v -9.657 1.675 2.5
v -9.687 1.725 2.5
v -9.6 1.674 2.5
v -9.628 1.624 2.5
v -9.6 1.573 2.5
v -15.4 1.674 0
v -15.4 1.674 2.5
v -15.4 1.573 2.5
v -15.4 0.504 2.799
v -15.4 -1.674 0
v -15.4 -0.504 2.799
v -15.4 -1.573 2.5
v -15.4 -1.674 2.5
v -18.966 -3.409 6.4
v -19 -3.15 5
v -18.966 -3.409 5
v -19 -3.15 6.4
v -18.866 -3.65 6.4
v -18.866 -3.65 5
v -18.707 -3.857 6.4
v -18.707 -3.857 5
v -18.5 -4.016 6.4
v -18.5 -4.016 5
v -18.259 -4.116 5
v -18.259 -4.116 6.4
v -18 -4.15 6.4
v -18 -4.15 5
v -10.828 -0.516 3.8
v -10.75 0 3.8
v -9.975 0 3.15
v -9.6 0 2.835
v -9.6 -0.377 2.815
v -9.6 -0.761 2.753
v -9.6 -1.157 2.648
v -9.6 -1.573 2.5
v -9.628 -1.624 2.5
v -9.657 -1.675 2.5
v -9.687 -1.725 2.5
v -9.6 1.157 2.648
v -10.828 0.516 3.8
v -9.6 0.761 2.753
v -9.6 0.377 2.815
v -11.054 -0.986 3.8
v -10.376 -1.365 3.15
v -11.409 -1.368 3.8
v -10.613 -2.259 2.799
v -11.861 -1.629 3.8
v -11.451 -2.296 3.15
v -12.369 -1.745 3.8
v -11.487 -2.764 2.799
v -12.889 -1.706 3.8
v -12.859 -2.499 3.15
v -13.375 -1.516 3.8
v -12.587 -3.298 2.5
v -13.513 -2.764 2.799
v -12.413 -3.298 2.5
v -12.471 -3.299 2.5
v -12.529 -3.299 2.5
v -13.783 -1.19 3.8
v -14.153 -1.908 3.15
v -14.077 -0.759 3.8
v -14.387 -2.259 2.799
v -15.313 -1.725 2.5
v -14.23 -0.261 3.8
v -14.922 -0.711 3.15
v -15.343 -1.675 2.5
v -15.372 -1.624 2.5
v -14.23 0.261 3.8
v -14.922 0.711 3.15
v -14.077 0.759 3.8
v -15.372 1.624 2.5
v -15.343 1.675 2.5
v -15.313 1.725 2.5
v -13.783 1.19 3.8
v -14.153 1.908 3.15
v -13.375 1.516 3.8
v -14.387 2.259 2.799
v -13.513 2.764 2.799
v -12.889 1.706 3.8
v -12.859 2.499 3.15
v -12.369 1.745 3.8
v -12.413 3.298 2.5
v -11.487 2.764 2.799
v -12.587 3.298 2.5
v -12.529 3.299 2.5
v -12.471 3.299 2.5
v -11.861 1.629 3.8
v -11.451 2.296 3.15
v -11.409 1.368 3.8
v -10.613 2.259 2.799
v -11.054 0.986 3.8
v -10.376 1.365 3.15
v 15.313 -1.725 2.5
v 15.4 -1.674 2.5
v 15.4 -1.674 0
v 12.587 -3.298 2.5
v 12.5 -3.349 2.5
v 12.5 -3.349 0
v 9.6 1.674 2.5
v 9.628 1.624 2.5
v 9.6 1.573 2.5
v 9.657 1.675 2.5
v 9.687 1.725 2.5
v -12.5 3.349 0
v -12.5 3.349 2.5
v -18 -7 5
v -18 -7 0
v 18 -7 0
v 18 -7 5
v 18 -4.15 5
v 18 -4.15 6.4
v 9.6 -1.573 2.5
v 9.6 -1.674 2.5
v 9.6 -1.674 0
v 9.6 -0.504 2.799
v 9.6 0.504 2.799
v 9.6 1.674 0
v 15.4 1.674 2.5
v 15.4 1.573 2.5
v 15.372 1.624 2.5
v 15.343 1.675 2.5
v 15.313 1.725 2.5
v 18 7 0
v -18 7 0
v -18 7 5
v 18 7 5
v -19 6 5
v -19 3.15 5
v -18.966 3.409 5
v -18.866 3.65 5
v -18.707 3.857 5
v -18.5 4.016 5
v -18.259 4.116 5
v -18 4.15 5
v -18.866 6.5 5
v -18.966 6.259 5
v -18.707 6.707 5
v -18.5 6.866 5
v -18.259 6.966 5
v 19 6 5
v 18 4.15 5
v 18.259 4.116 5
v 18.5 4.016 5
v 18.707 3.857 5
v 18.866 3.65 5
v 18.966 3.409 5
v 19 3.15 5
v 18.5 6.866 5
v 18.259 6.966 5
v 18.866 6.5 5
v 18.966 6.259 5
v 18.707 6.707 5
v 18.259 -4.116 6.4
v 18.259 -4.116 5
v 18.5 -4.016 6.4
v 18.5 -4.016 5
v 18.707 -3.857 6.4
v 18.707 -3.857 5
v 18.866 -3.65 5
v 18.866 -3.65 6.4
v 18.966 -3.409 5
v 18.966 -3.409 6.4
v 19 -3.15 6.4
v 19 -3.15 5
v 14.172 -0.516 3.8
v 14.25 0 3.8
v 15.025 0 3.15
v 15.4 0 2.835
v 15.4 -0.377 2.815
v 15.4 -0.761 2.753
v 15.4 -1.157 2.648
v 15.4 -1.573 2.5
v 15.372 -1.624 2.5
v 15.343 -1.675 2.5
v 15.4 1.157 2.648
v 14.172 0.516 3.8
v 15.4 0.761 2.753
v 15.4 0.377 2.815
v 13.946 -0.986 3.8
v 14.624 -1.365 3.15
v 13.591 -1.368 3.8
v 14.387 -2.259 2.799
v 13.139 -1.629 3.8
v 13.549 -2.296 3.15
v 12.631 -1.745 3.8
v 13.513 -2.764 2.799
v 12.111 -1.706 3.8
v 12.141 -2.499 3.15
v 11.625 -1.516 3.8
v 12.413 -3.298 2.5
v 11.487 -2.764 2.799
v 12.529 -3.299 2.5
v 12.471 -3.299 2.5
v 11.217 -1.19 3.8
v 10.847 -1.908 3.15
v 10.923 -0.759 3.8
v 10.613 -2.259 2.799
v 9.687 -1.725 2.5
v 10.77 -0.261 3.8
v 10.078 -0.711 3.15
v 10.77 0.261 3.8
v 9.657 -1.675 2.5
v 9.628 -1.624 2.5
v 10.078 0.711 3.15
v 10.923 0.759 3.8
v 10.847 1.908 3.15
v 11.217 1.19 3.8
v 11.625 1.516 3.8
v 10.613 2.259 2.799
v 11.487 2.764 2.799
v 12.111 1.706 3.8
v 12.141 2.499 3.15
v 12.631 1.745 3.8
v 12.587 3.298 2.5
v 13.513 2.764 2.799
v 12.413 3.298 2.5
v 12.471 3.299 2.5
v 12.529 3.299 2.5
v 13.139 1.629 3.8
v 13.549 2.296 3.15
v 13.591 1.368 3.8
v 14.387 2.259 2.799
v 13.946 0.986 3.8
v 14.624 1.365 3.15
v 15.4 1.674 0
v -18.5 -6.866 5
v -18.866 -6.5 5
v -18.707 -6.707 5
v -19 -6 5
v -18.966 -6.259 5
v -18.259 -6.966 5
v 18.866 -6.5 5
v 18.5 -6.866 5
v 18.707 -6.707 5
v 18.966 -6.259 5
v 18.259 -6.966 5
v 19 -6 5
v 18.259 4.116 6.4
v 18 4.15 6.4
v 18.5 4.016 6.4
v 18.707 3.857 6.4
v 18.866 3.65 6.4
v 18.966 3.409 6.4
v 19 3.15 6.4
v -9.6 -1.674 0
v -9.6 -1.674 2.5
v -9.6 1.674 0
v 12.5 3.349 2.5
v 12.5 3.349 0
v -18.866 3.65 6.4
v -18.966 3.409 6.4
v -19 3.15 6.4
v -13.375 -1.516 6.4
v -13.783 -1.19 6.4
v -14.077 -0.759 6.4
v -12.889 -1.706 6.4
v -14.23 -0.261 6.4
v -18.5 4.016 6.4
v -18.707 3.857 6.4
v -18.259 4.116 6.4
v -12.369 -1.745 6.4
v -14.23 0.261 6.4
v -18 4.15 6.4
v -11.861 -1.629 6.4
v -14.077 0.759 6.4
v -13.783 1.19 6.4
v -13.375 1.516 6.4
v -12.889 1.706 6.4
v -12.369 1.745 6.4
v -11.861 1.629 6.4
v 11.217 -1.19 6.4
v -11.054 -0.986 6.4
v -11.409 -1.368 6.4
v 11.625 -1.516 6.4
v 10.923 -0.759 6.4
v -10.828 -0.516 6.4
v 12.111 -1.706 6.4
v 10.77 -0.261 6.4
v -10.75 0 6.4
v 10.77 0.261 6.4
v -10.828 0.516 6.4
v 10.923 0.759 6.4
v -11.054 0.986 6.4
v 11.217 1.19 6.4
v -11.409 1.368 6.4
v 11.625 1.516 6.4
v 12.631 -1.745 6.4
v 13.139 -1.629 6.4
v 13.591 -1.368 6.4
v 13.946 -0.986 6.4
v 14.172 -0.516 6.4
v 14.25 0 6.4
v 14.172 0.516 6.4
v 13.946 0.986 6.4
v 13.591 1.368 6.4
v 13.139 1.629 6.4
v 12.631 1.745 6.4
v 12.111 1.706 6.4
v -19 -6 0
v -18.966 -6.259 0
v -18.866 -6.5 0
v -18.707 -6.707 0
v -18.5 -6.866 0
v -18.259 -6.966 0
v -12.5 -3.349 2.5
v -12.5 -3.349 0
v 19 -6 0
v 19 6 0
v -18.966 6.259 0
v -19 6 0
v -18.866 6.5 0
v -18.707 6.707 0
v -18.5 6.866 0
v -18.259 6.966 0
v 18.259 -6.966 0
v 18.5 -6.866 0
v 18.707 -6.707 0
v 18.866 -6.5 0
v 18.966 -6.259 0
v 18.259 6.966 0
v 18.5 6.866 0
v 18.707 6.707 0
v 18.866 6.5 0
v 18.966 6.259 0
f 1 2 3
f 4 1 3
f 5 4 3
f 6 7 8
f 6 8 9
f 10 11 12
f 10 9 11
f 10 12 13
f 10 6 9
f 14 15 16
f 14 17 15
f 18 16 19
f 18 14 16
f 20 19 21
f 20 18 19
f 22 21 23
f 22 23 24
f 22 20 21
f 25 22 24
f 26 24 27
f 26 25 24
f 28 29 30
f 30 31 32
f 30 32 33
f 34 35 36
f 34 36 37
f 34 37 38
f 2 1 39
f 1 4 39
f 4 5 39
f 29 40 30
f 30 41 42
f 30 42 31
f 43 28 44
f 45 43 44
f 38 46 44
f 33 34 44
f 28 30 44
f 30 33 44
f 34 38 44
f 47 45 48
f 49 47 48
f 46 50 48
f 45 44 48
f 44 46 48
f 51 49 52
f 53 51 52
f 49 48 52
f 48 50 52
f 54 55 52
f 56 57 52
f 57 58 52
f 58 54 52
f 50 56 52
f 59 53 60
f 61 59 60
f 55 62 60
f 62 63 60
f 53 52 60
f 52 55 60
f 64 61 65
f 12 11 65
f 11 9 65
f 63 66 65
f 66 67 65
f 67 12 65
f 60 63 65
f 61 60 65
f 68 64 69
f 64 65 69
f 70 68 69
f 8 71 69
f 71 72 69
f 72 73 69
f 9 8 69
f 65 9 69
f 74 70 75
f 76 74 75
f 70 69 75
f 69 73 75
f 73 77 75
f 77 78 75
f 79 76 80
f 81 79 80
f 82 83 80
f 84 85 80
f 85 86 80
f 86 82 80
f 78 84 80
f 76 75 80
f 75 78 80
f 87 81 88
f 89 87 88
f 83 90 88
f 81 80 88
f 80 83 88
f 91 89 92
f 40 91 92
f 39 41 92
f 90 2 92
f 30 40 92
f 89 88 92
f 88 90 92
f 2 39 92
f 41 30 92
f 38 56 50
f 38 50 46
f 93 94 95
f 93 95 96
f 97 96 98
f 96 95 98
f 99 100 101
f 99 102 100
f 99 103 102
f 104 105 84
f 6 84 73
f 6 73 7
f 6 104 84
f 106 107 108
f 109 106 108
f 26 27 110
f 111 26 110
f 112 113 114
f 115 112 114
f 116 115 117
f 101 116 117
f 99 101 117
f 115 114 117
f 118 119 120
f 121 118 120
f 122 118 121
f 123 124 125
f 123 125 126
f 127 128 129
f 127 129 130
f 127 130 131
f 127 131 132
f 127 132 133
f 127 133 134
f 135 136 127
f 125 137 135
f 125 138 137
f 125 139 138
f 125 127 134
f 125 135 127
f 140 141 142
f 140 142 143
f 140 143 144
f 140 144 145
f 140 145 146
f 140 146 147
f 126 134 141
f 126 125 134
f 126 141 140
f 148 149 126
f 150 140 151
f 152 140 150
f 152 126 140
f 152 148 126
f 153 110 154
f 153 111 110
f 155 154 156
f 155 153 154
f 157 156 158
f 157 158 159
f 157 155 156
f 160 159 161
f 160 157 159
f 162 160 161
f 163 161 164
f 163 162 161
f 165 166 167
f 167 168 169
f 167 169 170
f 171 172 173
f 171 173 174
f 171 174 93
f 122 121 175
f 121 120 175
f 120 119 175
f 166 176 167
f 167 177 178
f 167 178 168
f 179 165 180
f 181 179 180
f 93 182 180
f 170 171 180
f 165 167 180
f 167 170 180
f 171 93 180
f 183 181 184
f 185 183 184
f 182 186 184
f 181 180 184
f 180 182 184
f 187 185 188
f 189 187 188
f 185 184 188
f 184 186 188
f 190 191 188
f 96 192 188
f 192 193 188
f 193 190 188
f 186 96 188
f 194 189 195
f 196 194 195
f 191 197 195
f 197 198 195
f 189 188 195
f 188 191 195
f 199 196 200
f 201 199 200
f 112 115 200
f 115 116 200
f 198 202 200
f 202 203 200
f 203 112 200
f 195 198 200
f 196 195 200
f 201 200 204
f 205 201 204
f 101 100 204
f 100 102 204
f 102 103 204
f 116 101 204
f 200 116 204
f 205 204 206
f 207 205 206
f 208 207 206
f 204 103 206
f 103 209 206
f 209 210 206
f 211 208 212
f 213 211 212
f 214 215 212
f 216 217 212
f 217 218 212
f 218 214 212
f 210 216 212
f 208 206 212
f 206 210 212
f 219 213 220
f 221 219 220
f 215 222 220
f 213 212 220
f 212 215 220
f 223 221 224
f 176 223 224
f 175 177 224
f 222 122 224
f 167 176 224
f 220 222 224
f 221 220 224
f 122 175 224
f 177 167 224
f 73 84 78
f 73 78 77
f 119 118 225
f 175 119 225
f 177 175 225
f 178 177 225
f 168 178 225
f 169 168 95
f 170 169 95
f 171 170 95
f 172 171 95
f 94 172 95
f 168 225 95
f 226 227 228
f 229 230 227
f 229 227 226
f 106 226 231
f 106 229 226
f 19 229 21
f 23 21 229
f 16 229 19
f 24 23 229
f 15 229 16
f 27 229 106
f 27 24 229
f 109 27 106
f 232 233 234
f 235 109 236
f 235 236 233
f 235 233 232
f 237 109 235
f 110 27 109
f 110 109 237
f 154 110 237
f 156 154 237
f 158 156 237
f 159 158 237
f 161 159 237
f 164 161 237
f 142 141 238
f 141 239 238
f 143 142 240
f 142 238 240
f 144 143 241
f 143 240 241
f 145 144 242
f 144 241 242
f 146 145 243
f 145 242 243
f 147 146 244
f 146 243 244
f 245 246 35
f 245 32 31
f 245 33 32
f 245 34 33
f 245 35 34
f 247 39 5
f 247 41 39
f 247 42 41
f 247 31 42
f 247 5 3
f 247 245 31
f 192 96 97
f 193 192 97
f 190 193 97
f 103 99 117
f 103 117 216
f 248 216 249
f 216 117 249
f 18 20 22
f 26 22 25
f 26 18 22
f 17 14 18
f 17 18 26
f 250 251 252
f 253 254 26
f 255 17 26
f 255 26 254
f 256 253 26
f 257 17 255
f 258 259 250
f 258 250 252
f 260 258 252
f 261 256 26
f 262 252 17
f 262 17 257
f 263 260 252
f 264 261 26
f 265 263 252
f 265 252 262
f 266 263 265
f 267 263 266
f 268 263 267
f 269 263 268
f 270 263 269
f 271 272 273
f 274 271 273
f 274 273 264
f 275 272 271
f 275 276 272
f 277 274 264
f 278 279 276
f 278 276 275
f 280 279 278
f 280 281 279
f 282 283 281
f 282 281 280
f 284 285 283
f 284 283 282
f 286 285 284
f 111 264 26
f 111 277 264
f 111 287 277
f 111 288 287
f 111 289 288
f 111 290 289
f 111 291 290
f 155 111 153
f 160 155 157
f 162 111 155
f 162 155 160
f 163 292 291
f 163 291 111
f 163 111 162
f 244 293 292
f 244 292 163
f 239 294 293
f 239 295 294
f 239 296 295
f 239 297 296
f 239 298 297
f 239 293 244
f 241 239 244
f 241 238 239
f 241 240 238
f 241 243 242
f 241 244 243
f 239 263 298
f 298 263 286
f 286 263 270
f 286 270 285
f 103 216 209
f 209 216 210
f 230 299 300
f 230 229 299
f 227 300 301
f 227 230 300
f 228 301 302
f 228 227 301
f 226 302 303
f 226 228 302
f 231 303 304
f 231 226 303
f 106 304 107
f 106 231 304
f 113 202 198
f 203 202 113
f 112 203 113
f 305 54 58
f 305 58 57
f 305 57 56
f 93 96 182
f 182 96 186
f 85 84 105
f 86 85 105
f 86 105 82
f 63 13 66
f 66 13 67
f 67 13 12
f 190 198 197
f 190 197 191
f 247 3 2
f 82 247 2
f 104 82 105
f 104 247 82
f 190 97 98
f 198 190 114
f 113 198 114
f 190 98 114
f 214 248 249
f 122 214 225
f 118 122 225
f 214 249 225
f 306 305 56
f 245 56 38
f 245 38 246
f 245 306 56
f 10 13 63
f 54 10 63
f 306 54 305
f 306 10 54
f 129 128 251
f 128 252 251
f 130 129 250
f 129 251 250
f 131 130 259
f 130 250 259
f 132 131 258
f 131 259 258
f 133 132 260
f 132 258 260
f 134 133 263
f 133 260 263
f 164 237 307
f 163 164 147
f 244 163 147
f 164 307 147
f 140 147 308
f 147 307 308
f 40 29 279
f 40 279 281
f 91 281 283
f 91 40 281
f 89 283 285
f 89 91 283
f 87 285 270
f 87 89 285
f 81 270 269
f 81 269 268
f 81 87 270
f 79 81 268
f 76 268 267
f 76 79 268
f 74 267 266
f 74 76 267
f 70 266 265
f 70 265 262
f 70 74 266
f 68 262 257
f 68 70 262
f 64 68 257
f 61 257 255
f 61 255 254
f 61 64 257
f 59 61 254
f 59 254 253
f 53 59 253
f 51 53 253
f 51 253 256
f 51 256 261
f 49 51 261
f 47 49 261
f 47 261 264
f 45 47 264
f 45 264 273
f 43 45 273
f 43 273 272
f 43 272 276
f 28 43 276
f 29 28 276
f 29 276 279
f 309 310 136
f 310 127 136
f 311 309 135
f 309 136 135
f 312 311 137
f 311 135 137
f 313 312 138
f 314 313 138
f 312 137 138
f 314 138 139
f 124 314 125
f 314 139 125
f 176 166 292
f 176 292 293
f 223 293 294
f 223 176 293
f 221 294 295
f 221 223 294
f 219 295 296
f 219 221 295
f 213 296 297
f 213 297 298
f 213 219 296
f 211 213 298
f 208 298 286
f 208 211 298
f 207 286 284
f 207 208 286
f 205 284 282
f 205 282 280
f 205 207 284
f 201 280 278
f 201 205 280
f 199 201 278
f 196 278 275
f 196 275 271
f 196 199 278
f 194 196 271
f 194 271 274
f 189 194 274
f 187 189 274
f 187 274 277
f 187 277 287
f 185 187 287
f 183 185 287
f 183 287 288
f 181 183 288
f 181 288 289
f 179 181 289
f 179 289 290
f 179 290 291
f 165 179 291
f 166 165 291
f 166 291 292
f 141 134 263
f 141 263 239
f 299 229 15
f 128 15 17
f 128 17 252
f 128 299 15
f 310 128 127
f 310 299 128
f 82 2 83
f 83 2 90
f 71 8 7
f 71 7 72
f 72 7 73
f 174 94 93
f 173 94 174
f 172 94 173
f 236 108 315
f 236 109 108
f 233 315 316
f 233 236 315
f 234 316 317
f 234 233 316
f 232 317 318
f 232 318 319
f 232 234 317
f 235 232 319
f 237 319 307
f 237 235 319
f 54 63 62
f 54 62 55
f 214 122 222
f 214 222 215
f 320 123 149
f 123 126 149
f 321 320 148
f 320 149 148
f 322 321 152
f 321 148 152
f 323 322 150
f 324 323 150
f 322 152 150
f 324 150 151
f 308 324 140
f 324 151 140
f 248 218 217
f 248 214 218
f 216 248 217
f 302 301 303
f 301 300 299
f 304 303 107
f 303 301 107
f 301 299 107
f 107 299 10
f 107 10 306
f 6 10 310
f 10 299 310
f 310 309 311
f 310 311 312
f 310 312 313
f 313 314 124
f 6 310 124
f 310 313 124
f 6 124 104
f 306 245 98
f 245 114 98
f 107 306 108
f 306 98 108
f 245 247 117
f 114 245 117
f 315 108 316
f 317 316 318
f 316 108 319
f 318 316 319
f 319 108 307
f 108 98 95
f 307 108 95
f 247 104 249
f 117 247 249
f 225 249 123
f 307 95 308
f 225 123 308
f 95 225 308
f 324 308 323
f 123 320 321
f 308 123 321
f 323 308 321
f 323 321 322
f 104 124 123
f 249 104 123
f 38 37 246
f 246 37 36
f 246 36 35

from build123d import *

# Parameters (mm, degrees)
SKETCH_1_W          = 38
SKETCH_1_H          = 2.85
SKETCH_1_H_2        = 8.3
SKETCH_1_R          = 1.75
EXTRUDE_1_DEPTH     = 5
SKETCH_1_3_W        = 38
SKETCH_1_3_H        = 8.3
SKETCH_1_3_R        = 1.75
EXTRUDE_2_DEPTH     = 6.4
CUT_EXTRUDE_1_DEPTH = 2.5
FILLET_1_R          = 1
CHAMFER_1_SIZE      = 1.3
CHAMFER_1_SIZE_2    = 1.54927967


with BuildPart() as part:
    # Эскиз1 → Бобышка-Вытянуть1 (new body)
    # profile 1 of 3: a face of its own
    with BuildSketch(Plane.XY):
        with Locations((0, -5.575)):
            Rectangle(SKETCH_1_W, SKETCH_1_H)
    # profile 2 of 3: a face of its own
    with BuildSketch(Plane.XY):
        Rectangle(SKETCH_1_W, SKETCH_1_H_2)
        with Locations((-12.5, 0)):
            Circle(SKETCH_1_R, mode=Mode.SUBTRACT)
        with Locations((12.5, 0)):
            Circle(SKETCH_1_R, mode=Mode.SUBTRACT)
    # profile 3 of 3: a face of its own
    with BuildSketch(Plane.XY):
        with Locations((0, 5.575)):
            Rectangle(SKETCH_1_W, SKETCH_1_H)
    extrude(amount=EXTRUDE_1_DEPTH)

    # Эскиз1<3> → Бобышка-Вытянуть2 (add)
    with BuildSketch(Plane.XY):
        Rectangle(SKETCH_1_3_W, SKETCH_1_3_H)
        with Locations((-12.5, 0)):
            Circle(SKETCH_1_3_R, mode=Mode.SUBTRACT)
        with Locations((12.5, 0)):
            Circle(SKETCH_1_3_R, mode=Mode.SUBTRACT)
    extrude(amount=EXTRUDE_2_DEPTH)

    # Эскиз2 → Вырез-Вытянуть1 (cut)
    with BuildSketch(Plane(origin=(0, 0, 0), x_dir=(-1, 0, 0), z_dir=(0, 0, -1))):
        Polygon((-12.5, 3.348631561), (-15.4, 1.674315781), (-15.4, -1.674315781), (-12.5, -3.348631561), (-9.6, -1.674315781), (-9.6, 1.674315781), align=None)
        Polygon((9.6, 1.674315781), (12.5, 3.348631561), (15.4, 1.674315781), (15.4, -1.674315781), (12.5, -3.348631561), (9.6, -1.674315781), align=None)
    extrude(amount=-CUT_EXTRUDE_1_DEPTH, mode=Mode.SUBTRACT)

    # Скругление1
    fillet_1_edges = [part.edges().sort_by_distance(p)[0] for p in [
        (19, -7, 2.5),
        (-19, -7, 2.5),
        (-19, 7, 2.5),
        (19, 7, 2.5),
        (19, 4.15, 5.7),
        (-19, 4.15, 5.7),
        (-19, -4.15, 5.7),
        (19, -4.15, 5.7),
    ]]
    fillet(fillet_1_edges, radius=FILLET_1_R)

    # Фаска1
    # the kernel refuses this chamfer: 1.54927967, 1.3 mm, written as the material it takes off along each edge
    with BuildSketch(Plane(origin=(12.5, 0, 2.5), x_dir=(1, 0, 0), z_dir=(0, 1, 0))) as chamfer_1_piece_1_section:
        Polygon((1.75, -CHAMFER_1_SIZE), (1.75 + CHAMFER_1_SIZE_2, 0), (1.75, 0), align=None)
    chamfer_1_piece_1 = revolve(axis=Axis((12.5, 0, 2.5), (0, 0, -1)), mode=Mode.PRIVATE)
    chamfer_1_piece_1 = split(chamfer_1_piece_1, bisect_by=Plane(origin=(12.068379037, 3.597828041, 3.131156131), z_dir=(-0.4999999999999998, -0.8660254037844388, 0)), keep=Keep.TOP, mode=Mode.PRIVATE)
    chamfer_1_piece_1 = split(chamfer_1_piece_1, bisect_by=Plane(origin=(9.168379037, 1.425119301, 3.131156131), z_dir=(0.5000000000000004, -0.8660254037844385, 0)), keep=Keep.TOP, mode=Mode.PRIVATE)
    chamfer_1_piece_1 = split(chamfer_1_piece_1, bisect_by=Plane(origin=(15.4, 0, 3.131156131), z_dir=(-1, 0, 0)), keep=Keep.TOP, mode=Mode.PRIVATE)
    chamfer_1_piece_1 = split(chamfer_1_piece_1, bisect_by=Plane(origin=(9.6, 0, 3.131156131), z_dir=(1, 0, 0)), keep=Keep.TOP, mode=Mode.PRIVATE)
    chamfer_1_piece_1 = split(chamfer_1_piece_1, bisect_by=Plane(origin=(12.068379037, -3.597828041, 3.131156131), z_dir=(-0.4999999999999998, 0.8660254037844388, 0)), keep=Keep.TOP, mode=Mode.PRIVATE)
    chamfer_1_piece_1 = split(chamfer_1_piece_1, bisect_by=Plane(origin=(9.168379037, -1.425119301, 3.131156131), z_dir=(0.5000000000000001, 0.8660254037844386, 0)), keep=Keep.TOP, mode=Mode.PRIVATE)
    add(chamfer_1_piece_1, mode=Mode.SUBTRACT)
    with BuildSketch(Plane(origin=(-12.5, 0, 2.5), x_dir=(1, 0, 0), z_dir=(0, 1, 0))) as chamfer_1_piece_2_section:
        Polygon((1.75, -CHAMFER_1_SIZE), (1.75 + CHAMFER_1_SIZE_2, 0), (1.75, 0), align=None)
    chamfer_1_piece_2 = revolve(axis=Axis((-12.5, 0, 2.5), (0, 0, -1)), mode=Mode.PRIVATE)
    chamfer_1_piece_2 = split(chamfer_1_piece_2, bisect_by=Plane(origin=(-12.931620963, 3.597828041, 3.131156131), z_dir=(-0.5000000000000004, -0.8660254037844385, 0)), keep=Keep.TOP, mode=Mode.PRIVATE)
    chamfer_1_piece_2 = split(chamfer_1_piece_2, bisect_by=Plane(origin=(-9.6, 0, 3.131156131), z_dir=(-1, 0, 0)), keep=Keep.TOP, mode=Mode.PRIVATE)
    chamfer_1_piece_2 = split(chamfer_1_piece_2, bisect_by=Plane(origin=(-15.831620963, 1.425119301, 3.131156131), z_dir=(0.4999999999999998, -0.8660254037844388, 0)), keep=Keep.TOP, mode=Mode.PRIVATE)
    chamfer_1_piece_2 = split(chamfer_1_piece_2, bisect_by=Plane(origin=(-12.931620963, -3.597828041, 3.131156131), z_dir=(-0.5000000000000001, 0.8660254037844386, 0)), keep=Keep.TOP, mode=Mode.PRIVATE)
    chamfer_1_piece_2 = split(chamfer_1_piece_2, bisect_by=Plane(origin=(-15.4, 0, 3.131156131), z_dir=(1, 0, 0)), keep=Keep.TOP, mode=Mode.PRIVATE)
    chamfer_1_piece_2 = split(chamfer_1_piece_2, bisect_by=Plane(origin=(-15.831620963, -1.425119301, 3.131156131), z_dir=(0.4999999999999998, 0.8660254037844388, 0)), keep=Keep.TOP, mode=Mode.PRIVATE)
    add(chamfer_1_piece_2, mode=Mode.SUBTRACT)


solid = part.part
